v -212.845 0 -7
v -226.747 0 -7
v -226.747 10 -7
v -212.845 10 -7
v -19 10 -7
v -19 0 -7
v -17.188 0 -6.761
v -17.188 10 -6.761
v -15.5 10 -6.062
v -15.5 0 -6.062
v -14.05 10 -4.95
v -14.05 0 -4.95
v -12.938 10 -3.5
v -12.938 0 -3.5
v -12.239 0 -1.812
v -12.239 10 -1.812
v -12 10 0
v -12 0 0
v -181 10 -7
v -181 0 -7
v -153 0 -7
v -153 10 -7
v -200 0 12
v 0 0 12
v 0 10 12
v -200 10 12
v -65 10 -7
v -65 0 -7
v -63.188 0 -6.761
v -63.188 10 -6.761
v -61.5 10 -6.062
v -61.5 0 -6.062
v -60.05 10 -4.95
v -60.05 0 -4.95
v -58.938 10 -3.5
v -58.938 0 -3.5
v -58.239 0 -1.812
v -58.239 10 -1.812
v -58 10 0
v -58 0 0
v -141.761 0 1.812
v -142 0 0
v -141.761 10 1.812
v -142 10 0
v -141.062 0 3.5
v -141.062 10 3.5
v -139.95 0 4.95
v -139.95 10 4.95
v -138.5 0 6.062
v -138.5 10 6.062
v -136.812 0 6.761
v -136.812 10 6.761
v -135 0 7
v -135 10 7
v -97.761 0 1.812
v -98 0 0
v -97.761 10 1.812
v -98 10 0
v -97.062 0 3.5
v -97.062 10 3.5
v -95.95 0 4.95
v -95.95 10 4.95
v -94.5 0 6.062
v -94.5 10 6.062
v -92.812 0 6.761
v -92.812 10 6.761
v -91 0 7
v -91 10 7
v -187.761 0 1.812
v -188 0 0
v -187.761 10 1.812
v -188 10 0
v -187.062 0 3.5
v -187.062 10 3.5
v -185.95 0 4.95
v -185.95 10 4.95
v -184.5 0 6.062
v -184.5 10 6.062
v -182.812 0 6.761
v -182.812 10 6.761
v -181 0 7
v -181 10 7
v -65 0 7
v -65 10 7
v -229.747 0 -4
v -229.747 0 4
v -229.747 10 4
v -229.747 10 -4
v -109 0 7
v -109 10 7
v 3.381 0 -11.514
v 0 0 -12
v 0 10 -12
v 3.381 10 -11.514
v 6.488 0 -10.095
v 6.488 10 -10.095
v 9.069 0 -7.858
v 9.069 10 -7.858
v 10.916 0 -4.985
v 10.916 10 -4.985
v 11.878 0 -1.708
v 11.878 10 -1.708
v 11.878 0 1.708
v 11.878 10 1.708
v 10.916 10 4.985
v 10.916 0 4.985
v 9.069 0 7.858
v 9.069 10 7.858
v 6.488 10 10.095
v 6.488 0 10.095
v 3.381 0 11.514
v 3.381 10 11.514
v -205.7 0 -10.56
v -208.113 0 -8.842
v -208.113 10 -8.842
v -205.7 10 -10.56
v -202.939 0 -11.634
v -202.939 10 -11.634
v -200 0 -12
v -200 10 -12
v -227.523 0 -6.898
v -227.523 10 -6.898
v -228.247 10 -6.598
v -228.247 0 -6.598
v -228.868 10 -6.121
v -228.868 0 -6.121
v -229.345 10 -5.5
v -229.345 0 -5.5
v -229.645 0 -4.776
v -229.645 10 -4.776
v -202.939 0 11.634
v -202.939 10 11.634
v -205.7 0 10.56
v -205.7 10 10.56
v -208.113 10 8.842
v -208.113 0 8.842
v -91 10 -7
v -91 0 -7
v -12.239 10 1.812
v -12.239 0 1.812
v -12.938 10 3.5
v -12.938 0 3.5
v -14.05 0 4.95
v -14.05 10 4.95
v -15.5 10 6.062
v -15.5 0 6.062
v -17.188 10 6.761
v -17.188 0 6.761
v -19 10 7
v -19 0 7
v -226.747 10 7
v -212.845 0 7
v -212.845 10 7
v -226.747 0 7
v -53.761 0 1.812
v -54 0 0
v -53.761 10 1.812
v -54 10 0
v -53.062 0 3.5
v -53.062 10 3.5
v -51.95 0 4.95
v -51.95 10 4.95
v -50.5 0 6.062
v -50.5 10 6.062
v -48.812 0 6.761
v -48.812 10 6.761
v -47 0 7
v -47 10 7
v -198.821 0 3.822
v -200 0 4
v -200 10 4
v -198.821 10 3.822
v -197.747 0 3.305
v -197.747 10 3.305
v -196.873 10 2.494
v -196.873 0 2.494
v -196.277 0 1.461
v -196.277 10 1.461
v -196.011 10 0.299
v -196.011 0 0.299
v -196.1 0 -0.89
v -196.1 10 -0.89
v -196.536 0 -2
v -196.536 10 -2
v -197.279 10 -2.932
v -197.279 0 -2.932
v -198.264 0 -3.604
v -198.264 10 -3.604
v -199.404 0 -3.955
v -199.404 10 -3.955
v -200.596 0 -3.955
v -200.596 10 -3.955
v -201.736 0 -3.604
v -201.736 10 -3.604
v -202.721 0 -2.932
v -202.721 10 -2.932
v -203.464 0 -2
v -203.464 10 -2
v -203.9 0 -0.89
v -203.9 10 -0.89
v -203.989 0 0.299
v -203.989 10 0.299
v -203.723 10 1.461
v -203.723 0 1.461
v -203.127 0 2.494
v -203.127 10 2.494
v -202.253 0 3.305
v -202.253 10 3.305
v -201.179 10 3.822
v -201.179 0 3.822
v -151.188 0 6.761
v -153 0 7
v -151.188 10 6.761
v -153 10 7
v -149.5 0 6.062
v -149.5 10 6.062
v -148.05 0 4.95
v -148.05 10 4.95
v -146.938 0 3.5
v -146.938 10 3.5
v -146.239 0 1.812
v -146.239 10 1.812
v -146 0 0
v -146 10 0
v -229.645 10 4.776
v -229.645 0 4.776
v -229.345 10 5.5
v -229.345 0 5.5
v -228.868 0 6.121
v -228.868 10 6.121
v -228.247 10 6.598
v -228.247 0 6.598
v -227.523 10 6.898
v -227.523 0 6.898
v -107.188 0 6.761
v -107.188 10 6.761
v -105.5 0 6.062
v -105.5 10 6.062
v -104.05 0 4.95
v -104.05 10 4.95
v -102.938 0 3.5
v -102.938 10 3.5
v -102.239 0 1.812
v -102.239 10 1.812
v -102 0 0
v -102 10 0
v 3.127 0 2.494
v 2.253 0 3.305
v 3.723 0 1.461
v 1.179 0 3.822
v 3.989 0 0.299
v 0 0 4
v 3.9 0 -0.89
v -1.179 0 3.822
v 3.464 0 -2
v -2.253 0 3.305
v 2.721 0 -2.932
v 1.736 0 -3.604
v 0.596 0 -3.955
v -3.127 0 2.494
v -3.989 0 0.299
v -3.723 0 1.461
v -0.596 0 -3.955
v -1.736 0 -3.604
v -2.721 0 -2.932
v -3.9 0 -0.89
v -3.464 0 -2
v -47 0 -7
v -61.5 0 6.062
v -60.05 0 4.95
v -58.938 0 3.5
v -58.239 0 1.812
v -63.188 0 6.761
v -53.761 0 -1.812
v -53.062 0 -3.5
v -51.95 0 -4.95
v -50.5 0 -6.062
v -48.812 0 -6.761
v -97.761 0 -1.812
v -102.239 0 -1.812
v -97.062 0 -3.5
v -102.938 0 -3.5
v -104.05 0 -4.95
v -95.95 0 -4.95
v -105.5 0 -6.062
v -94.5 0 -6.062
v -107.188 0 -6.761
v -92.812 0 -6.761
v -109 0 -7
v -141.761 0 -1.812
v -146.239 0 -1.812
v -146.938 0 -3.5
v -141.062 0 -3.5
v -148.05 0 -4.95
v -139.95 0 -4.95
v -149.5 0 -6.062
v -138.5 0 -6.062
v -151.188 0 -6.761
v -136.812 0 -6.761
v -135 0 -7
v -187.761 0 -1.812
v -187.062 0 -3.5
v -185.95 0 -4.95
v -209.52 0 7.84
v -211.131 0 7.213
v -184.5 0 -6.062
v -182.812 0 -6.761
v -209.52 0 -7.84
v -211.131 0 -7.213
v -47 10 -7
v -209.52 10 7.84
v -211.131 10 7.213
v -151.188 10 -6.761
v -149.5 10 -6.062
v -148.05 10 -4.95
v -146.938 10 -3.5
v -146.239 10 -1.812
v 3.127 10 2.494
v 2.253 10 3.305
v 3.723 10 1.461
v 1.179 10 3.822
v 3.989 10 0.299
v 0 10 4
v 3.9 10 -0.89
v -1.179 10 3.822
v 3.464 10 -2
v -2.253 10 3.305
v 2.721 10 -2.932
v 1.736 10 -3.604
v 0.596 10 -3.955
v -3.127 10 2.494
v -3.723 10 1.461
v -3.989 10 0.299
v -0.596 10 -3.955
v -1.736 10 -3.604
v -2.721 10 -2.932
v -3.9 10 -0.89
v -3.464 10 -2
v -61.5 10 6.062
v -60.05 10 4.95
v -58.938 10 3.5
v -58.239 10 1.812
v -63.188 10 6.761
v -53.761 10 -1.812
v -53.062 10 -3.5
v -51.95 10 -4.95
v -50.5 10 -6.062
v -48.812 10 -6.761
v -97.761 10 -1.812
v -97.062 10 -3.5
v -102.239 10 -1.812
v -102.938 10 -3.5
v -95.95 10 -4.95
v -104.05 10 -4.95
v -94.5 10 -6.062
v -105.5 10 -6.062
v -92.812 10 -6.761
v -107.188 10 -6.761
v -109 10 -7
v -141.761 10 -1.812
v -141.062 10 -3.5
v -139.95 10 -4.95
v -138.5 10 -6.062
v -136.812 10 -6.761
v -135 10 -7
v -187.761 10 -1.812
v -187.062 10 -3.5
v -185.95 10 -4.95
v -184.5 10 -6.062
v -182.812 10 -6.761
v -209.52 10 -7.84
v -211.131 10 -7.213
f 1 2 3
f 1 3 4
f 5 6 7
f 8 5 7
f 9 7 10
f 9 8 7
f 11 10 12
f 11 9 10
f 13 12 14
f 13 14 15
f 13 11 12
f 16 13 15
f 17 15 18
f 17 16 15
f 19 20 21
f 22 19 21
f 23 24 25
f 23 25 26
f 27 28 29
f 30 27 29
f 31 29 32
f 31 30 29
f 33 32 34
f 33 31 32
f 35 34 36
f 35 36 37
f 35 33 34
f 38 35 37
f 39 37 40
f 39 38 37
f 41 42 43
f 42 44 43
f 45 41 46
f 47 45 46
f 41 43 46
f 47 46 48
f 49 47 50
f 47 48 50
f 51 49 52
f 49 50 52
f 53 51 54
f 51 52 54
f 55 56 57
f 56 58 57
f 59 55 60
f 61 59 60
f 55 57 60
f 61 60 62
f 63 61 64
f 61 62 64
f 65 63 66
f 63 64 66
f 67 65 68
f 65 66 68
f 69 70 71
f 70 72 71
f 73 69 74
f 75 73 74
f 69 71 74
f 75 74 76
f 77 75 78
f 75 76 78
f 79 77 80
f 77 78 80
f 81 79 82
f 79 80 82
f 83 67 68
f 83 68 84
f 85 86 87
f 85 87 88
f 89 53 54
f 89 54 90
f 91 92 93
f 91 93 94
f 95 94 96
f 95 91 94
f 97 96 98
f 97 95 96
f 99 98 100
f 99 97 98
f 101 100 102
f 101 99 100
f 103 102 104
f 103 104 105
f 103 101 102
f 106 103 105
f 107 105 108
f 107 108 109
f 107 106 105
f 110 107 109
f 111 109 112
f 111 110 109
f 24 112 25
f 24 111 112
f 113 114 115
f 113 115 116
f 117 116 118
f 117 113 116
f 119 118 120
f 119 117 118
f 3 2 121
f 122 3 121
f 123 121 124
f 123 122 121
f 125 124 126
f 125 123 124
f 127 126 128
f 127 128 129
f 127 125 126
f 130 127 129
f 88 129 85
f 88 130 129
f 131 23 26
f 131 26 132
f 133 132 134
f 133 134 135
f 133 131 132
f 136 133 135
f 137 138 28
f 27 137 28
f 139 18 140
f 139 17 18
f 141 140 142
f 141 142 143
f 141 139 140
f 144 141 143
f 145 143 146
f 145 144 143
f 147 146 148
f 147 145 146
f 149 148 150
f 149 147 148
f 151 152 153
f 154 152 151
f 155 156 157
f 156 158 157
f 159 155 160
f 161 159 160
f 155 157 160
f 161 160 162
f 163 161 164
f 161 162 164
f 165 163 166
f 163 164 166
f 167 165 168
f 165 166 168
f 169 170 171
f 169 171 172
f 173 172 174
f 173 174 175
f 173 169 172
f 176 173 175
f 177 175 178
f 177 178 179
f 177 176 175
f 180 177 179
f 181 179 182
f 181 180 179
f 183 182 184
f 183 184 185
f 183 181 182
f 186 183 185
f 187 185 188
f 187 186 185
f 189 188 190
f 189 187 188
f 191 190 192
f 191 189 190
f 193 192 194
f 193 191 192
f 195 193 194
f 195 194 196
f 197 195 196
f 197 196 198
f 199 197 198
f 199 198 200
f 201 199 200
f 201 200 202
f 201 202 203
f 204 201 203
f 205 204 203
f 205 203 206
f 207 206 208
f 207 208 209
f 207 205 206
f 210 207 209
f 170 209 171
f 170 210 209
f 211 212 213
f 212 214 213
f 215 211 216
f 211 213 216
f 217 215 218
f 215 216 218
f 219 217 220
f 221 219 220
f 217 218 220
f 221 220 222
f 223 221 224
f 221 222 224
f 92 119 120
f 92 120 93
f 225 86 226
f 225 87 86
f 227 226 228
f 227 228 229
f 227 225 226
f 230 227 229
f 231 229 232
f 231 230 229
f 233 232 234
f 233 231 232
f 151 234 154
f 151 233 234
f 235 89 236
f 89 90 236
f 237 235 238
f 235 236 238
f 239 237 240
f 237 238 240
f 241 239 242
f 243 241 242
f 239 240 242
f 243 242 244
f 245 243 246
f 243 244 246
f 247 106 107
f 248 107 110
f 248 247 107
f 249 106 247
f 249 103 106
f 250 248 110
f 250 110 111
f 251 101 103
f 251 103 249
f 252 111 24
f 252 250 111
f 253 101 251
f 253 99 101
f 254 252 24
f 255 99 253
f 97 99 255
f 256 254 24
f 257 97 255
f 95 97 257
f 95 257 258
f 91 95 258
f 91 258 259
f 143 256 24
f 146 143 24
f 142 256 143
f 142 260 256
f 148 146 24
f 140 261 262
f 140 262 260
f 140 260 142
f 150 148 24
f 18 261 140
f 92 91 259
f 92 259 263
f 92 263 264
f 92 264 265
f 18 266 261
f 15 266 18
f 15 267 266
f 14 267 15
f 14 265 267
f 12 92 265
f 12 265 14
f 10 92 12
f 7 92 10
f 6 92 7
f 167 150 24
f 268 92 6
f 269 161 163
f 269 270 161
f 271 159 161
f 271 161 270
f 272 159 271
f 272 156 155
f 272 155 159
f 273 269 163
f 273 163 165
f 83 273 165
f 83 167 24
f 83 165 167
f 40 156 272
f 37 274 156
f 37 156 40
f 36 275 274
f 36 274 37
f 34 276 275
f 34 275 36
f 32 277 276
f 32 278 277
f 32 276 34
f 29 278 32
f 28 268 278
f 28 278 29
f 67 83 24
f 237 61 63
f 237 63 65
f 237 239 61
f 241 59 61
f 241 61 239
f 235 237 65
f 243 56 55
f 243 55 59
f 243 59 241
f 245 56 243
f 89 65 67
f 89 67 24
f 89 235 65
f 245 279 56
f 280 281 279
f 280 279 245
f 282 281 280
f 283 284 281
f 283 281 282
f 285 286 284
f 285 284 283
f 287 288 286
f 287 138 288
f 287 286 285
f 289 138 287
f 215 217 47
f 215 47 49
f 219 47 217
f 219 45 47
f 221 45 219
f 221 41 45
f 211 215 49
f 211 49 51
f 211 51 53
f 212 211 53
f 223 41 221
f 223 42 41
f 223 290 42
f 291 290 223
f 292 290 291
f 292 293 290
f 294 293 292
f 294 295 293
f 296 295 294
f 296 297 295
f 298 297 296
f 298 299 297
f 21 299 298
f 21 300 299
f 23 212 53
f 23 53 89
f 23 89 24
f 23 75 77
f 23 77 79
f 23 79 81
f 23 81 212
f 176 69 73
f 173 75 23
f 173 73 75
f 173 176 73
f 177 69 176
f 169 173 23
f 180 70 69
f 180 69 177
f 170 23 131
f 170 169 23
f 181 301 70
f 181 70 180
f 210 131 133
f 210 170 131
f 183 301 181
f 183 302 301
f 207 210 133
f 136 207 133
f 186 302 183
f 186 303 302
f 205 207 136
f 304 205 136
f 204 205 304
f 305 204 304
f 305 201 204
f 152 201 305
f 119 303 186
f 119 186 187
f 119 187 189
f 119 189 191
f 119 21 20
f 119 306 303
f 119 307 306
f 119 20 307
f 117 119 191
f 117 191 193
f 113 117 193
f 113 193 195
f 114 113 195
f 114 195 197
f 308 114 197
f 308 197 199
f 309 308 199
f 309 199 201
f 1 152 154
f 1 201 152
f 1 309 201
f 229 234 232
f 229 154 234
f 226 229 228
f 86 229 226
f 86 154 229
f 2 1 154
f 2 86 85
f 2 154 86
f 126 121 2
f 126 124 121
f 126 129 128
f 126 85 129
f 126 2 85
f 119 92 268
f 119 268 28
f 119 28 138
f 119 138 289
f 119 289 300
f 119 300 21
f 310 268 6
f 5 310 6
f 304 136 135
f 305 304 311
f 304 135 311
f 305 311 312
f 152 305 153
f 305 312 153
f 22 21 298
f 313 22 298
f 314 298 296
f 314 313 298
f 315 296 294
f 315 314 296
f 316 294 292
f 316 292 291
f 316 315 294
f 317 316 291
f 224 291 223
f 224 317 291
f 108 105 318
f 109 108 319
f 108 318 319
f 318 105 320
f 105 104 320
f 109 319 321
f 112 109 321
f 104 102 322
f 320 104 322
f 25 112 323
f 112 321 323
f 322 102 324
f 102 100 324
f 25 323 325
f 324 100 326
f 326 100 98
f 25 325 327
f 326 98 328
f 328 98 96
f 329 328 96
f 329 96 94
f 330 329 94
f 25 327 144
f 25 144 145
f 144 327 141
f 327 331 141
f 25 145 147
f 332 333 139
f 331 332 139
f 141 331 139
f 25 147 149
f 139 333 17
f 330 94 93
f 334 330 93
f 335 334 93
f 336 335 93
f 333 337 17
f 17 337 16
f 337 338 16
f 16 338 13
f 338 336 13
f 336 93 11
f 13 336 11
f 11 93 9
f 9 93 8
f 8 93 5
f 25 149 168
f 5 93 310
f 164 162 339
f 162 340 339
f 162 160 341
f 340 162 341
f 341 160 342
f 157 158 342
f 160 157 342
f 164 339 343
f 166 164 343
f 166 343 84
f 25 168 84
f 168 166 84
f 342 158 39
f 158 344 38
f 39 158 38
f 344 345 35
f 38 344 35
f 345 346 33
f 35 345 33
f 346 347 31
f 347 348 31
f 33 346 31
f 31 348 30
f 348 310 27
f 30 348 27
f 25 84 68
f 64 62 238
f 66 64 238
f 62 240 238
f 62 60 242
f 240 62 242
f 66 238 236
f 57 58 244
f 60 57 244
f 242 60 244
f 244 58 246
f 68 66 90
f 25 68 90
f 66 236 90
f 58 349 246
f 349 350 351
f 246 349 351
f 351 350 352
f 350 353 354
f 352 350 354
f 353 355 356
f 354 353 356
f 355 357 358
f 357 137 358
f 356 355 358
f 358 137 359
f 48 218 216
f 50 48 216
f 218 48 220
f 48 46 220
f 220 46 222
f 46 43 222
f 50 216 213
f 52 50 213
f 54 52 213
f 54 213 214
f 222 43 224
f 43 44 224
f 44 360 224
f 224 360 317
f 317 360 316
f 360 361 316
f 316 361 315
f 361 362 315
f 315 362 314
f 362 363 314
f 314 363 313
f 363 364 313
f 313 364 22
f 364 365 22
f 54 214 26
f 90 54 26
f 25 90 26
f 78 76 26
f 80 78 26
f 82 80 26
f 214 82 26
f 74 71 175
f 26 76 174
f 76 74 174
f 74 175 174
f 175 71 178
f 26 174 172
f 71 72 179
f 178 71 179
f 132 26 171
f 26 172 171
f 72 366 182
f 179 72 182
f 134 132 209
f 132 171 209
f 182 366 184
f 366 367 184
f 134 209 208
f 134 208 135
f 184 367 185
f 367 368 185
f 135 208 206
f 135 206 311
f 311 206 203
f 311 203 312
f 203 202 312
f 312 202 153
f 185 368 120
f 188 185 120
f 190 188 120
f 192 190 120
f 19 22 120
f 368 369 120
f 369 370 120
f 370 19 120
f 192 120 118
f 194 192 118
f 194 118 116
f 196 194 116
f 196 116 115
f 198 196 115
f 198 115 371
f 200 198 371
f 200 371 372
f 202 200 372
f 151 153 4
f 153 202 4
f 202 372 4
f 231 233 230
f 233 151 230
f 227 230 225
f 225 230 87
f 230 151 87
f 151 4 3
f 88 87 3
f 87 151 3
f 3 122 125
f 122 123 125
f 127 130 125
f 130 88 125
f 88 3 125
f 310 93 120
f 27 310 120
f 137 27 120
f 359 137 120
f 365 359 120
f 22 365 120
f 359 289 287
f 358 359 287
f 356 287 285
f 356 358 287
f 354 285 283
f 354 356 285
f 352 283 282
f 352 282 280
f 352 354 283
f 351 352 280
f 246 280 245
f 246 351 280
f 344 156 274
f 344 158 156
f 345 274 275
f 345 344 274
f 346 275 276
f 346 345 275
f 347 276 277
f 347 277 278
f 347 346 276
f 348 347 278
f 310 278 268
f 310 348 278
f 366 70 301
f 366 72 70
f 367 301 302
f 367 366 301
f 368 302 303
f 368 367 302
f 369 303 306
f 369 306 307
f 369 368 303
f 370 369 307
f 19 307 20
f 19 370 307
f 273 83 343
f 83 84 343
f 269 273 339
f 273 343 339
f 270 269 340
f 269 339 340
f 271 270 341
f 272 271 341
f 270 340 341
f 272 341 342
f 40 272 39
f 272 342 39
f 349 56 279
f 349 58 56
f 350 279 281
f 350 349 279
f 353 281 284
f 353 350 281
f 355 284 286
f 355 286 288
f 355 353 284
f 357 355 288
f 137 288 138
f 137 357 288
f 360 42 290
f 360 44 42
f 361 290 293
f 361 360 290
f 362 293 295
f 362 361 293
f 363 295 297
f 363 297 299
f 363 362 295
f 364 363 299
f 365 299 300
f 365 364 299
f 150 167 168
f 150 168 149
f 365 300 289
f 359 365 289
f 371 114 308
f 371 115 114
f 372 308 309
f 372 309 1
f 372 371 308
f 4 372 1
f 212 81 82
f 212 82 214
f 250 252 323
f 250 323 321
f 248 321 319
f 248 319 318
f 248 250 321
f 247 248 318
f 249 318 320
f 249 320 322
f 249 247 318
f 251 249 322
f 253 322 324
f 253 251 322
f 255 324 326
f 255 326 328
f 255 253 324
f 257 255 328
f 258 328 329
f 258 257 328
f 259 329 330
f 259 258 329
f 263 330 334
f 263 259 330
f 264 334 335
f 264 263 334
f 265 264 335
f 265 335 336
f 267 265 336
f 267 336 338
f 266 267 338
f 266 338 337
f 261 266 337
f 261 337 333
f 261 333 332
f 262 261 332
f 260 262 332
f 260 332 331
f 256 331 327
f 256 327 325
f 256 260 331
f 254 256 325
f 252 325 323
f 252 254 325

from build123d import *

# Parameters (mm, degrees)
SKETCH1_R           = 4
SKETCH1_W           = 42
SKETCH1_H           = 14
SKETCH1_W_2         = 40
BOSS_EXTRUDE1_DEPTH = 10
FILLET1_R           = 7
FILLET2_R           = 3


with BuildPart() as part:
    # Sketch1 → Boss-Extrude1 (new body)
    with BuildSketch(Plane(origin=(0, 0, 0), x_dir=(1, 0, 0), z_dir=(0, 1, 0))):
        with BuildLine():
            Line((-200, 12), (0, 12))
            ThreePointArc((0, 12), (12, 0), (0, -12))
            Line((0, -12), (-200, -12))
            ThreePointArc((-200, -12), (-205.477225575, -10.677078252), (-209.746794345, -7))
            Line((-209.746794345, -7), (-229.746794345, -7))
            Line((-229.746794345, -7), (-229.746794345, 7))
            Line((-229.746794345, 7), (-209.746794345, 7))
            ThreePointArc((-209.746794345, 7), (-205.477225575, 10.677078252), (-200, 12))
        make_face()
        with Locations(Location((-200, 0, 0), (0, 0, 270))):
            Circle(SKETCH1_R, mode=Mode.SUBTRACT)
        with Locations(Location((0, 0, 0), (0, 0, 270))):
            Circle(SKETCH1_R, mode=Mode.SUBTRACT)
        with Locations((-167, 0)):
            Rectangle(SKETCH1_W, SKETCH1_H, mode=Mode.SUBTRACT)
        with Locations((-122, 0)):
            Rectangle(SKETCH1_W_2, SKETCH1_H, mode=Mode.SUBTRACT)
        with Locations((-78, 0)):
            Rectangle(SKETCH1_W_2, SKETCH1_H, mode=Mode.SUBTRACT)
        with Locations((-33, 0)):
            Rectangle(SKETCH1_W, SKETCH1_H, mode=Mode.SUBTRACT)
    extrude(amount=BOSS_EXTRUDE1_DEPTH)

    # Fillet1
    fillet1_edges = [part.edges().sort_by_distance(p)[0] for p in [
        (-142, 5, -7),
        (-98, 5, -7),
        (-54, 5, -7),
        (-58, 5, -7),
        (-12, 5, -7),
        (-102, 5, -7),
        (-146, 5, -7),
        (-146, 5, 7),
        (-102, 5, 7),
        (-58, 5, 7),
        (-12, 5, 7),
        (-54, 5, 7),
        (-98, 5, 7),
        (-142, 5, 7),
        (-188, 5, 7),
        (-188, 5, -7),
        (-209.746794345, 5, 7),
        (-209.746794345, 5, -7),
    ]]
    fillet(fillet1_edges, radius=FILLET1_R - 0.0001)  # a hair under: the kernel refuses the full size

    # Fillet2
    fillet2_edges = [part.edges().sort_by_distance(p)[0] for p in [
        (-229.746794345, 5, 7),
        (-229.746794345, 5, -7),
    ]]
    fillet(fillet2_edges, radius=FILLET2_R)


solid = part.part
